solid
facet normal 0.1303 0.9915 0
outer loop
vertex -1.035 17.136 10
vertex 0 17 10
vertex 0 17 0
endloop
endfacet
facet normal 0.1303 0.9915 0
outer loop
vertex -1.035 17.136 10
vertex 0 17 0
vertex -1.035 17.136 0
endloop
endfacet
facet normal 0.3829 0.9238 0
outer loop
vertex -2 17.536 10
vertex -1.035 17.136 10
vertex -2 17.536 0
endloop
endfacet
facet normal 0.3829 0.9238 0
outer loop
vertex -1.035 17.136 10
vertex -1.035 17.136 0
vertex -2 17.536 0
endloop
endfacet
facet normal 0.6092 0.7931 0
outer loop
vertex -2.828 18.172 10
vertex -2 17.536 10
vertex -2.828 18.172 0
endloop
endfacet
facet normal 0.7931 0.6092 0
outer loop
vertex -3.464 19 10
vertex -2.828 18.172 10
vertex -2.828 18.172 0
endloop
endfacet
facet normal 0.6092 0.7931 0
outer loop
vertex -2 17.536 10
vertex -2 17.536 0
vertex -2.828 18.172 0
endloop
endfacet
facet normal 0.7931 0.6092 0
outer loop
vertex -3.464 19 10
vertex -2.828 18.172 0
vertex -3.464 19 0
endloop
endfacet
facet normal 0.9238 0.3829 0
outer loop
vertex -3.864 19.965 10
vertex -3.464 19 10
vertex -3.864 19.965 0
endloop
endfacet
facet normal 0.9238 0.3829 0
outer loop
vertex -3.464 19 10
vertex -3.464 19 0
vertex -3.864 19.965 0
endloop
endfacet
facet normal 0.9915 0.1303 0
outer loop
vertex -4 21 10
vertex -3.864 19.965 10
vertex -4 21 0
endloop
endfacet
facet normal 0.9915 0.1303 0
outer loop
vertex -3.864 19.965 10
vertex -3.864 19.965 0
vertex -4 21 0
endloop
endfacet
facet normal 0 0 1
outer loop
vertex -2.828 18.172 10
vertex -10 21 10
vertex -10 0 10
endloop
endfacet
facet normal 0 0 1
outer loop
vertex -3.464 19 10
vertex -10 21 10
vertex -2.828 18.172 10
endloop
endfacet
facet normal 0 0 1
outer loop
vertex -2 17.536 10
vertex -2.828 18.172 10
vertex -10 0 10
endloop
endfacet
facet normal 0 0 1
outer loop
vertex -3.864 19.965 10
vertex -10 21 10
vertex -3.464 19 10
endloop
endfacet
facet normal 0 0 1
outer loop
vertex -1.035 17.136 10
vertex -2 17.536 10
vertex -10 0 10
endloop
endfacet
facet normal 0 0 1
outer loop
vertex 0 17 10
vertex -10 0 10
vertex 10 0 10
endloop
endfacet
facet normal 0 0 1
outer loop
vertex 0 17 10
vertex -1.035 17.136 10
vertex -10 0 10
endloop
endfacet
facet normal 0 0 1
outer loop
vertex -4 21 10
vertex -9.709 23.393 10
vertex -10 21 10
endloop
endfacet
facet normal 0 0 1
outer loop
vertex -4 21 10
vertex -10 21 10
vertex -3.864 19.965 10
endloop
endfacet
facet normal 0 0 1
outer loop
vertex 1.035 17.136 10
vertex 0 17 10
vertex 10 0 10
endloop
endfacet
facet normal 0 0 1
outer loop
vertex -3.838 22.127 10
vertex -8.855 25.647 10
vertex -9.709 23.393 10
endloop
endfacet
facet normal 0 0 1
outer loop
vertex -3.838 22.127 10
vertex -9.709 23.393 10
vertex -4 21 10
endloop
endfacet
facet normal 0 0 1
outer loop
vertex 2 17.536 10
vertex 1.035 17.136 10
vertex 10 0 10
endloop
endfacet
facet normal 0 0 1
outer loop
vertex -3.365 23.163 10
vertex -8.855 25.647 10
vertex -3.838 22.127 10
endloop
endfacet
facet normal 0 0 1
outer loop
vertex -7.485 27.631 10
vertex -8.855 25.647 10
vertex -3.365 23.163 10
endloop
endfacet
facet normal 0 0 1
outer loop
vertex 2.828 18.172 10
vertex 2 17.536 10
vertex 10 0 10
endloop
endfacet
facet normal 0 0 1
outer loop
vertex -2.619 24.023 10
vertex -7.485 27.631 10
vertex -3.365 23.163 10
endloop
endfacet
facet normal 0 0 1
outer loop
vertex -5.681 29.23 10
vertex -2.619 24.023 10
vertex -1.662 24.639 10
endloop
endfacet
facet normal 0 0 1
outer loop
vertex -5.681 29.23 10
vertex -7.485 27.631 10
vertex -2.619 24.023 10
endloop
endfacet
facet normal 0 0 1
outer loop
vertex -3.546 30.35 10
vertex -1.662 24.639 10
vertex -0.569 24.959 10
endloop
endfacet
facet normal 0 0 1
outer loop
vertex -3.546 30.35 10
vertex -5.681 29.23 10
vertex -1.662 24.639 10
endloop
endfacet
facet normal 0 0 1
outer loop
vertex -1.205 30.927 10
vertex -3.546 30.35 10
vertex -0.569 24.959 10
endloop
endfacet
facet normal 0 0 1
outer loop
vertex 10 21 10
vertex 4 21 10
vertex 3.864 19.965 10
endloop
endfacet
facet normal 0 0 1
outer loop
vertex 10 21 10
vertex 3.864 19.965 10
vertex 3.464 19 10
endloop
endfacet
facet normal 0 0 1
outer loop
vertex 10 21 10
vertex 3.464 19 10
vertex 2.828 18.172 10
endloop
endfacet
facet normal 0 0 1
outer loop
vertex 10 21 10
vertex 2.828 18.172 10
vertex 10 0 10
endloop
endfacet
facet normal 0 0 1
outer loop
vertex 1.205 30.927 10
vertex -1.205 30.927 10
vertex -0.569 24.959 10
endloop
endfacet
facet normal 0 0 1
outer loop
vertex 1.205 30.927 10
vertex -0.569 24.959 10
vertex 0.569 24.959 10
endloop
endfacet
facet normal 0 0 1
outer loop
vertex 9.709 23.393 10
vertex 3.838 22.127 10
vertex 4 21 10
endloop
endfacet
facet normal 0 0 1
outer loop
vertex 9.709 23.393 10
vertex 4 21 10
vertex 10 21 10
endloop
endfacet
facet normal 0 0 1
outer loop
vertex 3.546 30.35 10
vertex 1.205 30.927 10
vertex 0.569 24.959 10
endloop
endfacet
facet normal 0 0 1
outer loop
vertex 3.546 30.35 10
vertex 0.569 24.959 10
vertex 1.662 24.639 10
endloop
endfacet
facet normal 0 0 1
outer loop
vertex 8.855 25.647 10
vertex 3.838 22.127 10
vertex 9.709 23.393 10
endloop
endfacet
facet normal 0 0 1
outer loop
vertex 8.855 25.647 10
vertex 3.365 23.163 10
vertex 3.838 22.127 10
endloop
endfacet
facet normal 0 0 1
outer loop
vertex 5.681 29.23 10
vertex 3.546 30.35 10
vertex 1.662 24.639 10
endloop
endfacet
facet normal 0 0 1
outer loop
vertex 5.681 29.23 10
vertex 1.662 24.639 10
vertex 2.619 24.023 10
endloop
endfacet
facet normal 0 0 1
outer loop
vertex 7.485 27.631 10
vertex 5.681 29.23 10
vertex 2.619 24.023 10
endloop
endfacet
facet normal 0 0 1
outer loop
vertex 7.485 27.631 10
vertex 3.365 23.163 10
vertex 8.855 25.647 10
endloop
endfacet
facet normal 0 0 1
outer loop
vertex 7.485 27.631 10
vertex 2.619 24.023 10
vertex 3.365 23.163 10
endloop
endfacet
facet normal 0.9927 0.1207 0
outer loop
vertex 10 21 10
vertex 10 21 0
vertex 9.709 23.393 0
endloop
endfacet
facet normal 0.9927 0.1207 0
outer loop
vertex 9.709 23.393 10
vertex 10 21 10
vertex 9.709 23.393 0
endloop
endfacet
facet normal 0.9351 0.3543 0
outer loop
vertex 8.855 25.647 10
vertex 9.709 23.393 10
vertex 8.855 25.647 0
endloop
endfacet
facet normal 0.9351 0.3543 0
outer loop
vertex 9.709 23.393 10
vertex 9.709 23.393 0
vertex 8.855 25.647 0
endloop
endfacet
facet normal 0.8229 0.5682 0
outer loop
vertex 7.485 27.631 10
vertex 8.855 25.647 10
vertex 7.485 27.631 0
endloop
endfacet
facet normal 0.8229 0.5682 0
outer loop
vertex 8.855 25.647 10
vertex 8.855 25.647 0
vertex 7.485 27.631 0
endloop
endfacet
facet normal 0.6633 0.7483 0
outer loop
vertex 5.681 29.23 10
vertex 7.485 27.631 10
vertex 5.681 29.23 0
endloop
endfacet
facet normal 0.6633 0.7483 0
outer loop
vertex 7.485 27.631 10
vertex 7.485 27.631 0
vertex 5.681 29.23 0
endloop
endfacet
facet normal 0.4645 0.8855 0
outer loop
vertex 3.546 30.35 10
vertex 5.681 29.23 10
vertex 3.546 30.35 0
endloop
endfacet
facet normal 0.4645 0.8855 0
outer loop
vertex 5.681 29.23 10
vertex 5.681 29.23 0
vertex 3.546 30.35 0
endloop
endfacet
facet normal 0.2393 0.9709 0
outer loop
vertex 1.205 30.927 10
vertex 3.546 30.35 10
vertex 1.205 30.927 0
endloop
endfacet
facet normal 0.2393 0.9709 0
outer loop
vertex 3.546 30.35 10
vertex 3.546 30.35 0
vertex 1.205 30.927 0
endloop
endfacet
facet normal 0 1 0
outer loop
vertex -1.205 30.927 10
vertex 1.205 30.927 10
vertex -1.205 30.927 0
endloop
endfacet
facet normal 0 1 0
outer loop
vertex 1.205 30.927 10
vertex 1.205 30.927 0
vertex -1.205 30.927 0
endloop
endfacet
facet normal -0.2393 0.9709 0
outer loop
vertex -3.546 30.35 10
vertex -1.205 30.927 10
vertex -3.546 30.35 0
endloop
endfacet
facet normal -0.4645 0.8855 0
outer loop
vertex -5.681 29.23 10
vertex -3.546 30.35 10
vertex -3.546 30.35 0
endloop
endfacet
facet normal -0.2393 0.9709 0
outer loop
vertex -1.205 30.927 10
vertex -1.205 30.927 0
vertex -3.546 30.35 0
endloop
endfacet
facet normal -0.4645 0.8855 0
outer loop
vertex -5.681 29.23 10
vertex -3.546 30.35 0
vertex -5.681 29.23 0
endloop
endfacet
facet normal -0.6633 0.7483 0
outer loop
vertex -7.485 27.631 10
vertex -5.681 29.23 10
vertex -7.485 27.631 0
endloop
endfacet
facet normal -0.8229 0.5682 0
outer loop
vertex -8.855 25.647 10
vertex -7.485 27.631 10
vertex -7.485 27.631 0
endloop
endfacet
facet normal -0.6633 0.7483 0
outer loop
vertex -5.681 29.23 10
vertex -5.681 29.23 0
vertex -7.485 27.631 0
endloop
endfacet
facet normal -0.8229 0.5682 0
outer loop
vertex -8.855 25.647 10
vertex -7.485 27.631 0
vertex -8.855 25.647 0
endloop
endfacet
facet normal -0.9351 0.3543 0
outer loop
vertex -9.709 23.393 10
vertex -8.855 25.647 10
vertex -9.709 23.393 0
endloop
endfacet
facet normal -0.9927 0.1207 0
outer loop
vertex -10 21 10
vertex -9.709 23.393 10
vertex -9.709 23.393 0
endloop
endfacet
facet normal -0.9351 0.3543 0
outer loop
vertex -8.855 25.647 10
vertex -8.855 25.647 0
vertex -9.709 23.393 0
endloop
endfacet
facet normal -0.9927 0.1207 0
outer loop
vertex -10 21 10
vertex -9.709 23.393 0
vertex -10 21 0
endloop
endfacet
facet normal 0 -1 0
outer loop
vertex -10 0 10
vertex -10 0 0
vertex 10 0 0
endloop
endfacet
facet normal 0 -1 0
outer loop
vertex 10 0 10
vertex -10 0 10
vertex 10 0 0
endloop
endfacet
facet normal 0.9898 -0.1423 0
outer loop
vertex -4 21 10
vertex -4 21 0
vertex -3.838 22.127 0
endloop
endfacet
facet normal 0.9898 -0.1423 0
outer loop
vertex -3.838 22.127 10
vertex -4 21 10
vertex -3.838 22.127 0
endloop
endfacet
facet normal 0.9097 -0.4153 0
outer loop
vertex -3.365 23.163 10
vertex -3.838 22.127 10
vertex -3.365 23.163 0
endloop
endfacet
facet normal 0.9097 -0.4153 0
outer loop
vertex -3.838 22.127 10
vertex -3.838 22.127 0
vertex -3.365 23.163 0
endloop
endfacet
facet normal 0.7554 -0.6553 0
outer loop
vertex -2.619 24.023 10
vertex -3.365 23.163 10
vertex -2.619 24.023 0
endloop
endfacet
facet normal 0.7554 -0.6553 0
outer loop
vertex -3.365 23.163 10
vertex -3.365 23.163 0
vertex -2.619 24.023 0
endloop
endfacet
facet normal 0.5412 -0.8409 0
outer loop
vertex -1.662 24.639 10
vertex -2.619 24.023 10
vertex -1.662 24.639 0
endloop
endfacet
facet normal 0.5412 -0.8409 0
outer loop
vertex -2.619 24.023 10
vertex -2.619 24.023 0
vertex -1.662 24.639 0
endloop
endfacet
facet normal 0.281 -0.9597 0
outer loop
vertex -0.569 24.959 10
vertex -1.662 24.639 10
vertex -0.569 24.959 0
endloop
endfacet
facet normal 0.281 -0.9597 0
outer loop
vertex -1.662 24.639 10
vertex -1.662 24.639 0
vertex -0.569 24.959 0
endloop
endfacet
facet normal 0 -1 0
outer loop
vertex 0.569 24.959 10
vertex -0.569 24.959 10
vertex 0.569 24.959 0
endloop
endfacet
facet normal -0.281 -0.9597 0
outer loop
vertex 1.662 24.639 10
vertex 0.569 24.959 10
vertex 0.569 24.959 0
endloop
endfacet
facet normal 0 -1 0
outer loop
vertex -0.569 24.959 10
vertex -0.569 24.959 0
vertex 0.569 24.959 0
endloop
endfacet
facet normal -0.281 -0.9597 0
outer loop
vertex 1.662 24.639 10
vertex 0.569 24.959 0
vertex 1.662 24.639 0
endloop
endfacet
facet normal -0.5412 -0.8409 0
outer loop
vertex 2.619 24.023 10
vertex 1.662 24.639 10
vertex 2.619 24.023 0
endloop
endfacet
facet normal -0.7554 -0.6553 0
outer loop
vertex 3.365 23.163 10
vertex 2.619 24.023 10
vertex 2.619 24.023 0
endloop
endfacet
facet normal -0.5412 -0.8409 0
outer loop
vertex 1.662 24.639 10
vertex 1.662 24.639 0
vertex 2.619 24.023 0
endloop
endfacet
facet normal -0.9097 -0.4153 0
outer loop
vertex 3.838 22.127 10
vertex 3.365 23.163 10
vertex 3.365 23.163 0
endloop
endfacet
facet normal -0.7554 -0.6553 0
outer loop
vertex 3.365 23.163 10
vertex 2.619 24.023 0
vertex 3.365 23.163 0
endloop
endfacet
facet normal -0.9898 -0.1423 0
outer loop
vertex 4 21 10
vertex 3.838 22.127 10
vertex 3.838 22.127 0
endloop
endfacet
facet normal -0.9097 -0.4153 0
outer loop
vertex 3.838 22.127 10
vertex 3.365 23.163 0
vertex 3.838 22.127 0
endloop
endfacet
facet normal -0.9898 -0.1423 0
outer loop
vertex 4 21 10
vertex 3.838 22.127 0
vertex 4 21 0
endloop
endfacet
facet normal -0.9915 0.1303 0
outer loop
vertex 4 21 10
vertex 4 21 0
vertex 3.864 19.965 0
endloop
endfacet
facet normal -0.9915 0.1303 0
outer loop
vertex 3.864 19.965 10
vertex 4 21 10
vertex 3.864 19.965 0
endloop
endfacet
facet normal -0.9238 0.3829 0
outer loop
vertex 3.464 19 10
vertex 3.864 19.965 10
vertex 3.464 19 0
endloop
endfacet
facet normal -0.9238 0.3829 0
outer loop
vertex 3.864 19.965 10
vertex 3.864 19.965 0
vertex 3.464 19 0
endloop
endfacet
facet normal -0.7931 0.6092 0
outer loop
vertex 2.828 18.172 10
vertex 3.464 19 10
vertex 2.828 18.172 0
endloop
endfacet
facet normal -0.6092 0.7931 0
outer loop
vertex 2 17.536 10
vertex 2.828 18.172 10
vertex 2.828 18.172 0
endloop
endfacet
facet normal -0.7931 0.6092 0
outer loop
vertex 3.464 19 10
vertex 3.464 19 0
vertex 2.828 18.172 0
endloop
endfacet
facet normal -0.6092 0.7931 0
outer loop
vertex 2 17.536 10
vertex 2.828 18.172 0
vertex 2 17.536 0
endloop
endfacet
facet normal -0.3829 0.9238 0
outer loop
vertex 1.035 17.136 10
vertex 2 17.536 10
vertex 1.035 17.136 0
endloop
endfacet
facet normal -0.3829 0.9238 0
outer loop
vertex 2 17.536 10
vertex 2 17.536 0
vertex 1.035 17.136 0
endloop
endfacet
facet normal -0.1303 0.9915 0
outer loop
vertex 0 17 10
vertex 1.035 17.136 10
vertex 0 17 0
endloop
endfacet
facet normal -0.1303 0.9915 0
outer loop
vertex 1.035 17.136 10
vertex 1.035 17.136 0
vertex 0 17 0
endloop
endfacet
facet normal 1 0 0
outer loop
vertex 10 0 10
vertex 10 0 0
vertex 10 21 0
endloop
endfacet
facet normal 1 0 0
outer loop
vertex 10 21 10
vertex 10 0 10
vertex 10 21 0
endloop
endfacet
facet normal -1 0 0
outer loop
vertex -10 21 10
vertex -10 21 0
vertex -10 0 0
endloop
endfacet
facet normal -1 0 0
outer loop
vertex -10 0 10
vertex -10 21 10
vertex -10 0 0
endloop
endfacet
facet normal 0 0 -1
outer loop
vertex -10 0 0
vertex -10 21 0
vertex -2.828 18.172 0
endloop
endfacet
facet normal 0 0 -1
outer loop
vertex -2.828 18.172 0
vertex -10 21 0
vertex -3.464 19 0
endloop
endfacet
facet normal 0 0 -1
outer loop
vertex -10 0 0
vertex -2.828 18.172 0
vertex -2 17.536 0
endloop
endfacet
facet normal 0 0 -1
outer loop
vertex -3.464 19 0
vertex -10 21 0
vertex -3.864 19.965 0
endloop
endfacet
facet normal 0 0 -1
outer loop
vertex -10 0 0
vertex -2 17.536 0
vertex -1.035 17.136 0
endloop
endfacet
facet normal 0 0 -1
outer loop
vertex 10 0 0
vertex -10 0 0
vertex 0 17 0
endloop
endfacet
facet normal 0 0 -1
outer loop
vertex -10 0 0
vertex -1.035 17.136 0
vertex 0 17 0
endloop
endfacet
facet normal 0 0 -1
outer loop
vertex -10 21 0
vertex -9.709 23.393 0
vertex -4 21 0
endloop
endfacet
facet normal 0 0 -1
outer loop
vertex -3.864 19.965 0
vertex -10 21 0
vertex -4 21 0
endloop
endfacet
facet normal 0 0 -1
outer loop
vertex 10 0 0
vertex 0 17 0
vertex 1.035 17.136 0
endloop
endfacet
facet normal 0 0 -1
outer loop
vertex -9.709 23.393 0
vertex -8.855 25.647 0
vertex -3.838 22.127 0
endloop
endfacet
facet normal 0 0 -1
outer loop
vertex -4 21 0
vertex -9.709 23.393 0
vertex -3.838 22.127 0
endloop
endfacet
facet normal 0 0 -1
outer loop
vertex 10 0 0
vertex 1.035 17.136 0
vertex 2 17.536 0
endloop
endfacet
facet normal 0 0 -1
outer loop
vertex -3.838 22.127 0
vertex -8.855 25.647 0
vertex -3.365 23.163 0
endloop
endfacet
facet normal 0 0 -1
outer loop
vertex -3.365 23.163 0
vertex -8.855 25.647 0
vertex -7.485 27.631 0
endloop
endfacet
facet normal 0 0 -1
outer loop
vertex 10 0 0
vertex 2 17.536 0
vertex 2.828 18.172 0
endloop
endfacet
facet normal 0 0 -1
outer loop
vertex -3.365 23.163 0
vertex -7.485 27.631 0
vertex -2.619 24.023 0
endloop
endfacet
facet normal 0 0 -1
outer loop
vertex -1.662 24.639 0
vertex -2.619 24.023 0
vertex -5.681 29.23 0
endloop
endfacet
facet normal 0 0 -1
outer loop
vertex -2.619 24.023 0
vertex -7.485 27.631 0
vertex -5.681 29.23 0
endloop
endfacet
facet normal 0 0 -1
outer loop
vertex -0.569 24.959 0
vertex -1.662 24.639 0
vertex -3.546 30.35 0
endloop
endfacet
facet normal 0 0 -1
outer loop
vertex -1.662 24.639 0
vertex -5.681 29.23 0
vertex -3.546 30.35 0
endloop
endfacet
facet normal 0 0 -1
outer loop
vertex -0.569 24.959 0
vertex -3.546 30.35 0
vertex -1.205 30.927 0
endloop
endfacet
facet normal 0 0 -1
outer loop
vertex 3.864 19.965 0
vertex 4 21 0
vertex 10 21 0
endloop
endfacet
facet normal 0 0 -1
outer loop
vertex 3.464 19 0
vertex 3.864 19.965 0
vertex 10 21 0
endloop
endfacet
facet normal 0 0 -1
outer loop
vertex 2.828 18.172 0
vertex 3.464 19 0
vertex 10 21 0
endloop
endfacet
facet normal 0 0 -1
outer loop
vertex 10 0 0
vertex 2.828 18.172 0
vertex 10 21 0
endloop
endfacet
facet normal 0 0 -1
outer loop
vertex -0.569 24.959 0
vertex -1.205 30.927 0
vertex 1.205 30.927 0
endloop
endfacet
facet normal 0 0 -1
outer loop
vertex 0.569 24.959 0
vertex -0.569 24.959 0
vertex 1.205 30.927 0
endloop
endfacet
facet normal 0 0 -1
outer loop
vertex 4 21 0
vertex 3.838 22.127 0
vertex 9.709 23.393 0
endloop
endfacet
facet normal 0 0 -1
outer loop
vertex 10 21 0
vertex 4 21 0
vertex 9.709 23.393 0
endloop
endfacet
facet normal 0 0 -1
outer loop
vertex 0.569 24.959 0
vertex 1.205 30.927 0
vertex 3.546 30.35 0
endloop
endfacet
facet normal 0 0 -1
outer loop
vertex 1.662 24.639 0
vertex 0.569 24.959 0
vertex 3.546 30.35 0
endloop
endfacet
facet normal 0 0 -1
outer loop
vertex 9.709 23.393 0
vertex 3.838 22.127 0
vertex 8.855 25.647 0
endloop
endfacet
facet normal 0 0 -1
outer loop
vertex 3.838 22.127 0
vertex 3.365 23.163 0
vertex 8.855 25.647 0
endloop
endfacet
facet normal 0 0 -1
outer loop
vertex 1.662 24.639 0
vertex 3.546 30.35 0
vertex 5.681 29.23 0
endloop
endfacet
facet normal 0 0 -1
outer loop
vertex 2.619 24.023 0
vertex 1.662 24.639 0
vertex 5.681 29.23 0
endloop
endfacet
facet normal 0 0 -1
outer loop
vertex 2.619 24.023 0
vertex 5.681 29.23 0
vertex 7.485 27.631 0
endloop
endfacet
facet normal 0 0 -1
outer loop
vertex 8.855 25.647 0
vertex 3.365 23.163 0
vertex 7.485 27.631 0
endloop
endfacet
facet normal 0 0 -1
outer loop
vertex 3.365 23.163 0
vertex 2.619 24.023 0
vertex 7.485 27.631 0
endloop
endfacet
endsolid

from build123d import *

# Parameters (mm, degrees)
EXTRUDE_1_DEPTH = 10


with BuildPart() as part:
    # 스케치1 → 보스-돌출1 (new body)
    with BuildSketch(Plane.XY):
        with BuildLine():
            ThreePointArc((10, 21), (0, 31), (-10, 21))
            Line((-10, 21), (-4, 21))
            ThreePointArc((-4, 21), (0, 25), (4, 21))
            Line((4, 21), (10, 21))
        make_face()
        with BuildLine():
            ThreePointArc((-10, 21), (-7.071067812, 13.928932188), (0, 11))
            Line((0, 11), (0, 17))
            ThreePointArc((0, 17), (-2.828427125, 18.171572875), (-4, 21))
            Line((-4, 21), (-10, 21))
        make_face()
        with BuildLine():
            Line((0, 17), (0, 11))
            ThreePointArc((0, 11), (7.071067812, 13.928932188), (10, 21))
            Line((10, 21), (4, 21))
            ThreePointArc((4, 21), (2.828427125, 18.171572875), (0, 17))
        make_face()
        with BuildLine():
            Line((0, 11), (0, 0))
            Line((0, 0), (10, 0))
            Line((10, 0), (10, 21))
            ThreePointArc((10, 21), (7.071067812, 13.928932188), (0, 11))
        make_face()
        with BuildLine():
            Line((-10, 0), (0, 0))
            Line((0, 0), (0, 11))
            ThreePointArc((0, 11), (-7.071067812, 13.928932188), (-10, 21))
            Line((-10, 21), (-10, 0))
        make_face()
    extrude(amount=EXTRUDE_1_DEPTH)


solid = part.part
